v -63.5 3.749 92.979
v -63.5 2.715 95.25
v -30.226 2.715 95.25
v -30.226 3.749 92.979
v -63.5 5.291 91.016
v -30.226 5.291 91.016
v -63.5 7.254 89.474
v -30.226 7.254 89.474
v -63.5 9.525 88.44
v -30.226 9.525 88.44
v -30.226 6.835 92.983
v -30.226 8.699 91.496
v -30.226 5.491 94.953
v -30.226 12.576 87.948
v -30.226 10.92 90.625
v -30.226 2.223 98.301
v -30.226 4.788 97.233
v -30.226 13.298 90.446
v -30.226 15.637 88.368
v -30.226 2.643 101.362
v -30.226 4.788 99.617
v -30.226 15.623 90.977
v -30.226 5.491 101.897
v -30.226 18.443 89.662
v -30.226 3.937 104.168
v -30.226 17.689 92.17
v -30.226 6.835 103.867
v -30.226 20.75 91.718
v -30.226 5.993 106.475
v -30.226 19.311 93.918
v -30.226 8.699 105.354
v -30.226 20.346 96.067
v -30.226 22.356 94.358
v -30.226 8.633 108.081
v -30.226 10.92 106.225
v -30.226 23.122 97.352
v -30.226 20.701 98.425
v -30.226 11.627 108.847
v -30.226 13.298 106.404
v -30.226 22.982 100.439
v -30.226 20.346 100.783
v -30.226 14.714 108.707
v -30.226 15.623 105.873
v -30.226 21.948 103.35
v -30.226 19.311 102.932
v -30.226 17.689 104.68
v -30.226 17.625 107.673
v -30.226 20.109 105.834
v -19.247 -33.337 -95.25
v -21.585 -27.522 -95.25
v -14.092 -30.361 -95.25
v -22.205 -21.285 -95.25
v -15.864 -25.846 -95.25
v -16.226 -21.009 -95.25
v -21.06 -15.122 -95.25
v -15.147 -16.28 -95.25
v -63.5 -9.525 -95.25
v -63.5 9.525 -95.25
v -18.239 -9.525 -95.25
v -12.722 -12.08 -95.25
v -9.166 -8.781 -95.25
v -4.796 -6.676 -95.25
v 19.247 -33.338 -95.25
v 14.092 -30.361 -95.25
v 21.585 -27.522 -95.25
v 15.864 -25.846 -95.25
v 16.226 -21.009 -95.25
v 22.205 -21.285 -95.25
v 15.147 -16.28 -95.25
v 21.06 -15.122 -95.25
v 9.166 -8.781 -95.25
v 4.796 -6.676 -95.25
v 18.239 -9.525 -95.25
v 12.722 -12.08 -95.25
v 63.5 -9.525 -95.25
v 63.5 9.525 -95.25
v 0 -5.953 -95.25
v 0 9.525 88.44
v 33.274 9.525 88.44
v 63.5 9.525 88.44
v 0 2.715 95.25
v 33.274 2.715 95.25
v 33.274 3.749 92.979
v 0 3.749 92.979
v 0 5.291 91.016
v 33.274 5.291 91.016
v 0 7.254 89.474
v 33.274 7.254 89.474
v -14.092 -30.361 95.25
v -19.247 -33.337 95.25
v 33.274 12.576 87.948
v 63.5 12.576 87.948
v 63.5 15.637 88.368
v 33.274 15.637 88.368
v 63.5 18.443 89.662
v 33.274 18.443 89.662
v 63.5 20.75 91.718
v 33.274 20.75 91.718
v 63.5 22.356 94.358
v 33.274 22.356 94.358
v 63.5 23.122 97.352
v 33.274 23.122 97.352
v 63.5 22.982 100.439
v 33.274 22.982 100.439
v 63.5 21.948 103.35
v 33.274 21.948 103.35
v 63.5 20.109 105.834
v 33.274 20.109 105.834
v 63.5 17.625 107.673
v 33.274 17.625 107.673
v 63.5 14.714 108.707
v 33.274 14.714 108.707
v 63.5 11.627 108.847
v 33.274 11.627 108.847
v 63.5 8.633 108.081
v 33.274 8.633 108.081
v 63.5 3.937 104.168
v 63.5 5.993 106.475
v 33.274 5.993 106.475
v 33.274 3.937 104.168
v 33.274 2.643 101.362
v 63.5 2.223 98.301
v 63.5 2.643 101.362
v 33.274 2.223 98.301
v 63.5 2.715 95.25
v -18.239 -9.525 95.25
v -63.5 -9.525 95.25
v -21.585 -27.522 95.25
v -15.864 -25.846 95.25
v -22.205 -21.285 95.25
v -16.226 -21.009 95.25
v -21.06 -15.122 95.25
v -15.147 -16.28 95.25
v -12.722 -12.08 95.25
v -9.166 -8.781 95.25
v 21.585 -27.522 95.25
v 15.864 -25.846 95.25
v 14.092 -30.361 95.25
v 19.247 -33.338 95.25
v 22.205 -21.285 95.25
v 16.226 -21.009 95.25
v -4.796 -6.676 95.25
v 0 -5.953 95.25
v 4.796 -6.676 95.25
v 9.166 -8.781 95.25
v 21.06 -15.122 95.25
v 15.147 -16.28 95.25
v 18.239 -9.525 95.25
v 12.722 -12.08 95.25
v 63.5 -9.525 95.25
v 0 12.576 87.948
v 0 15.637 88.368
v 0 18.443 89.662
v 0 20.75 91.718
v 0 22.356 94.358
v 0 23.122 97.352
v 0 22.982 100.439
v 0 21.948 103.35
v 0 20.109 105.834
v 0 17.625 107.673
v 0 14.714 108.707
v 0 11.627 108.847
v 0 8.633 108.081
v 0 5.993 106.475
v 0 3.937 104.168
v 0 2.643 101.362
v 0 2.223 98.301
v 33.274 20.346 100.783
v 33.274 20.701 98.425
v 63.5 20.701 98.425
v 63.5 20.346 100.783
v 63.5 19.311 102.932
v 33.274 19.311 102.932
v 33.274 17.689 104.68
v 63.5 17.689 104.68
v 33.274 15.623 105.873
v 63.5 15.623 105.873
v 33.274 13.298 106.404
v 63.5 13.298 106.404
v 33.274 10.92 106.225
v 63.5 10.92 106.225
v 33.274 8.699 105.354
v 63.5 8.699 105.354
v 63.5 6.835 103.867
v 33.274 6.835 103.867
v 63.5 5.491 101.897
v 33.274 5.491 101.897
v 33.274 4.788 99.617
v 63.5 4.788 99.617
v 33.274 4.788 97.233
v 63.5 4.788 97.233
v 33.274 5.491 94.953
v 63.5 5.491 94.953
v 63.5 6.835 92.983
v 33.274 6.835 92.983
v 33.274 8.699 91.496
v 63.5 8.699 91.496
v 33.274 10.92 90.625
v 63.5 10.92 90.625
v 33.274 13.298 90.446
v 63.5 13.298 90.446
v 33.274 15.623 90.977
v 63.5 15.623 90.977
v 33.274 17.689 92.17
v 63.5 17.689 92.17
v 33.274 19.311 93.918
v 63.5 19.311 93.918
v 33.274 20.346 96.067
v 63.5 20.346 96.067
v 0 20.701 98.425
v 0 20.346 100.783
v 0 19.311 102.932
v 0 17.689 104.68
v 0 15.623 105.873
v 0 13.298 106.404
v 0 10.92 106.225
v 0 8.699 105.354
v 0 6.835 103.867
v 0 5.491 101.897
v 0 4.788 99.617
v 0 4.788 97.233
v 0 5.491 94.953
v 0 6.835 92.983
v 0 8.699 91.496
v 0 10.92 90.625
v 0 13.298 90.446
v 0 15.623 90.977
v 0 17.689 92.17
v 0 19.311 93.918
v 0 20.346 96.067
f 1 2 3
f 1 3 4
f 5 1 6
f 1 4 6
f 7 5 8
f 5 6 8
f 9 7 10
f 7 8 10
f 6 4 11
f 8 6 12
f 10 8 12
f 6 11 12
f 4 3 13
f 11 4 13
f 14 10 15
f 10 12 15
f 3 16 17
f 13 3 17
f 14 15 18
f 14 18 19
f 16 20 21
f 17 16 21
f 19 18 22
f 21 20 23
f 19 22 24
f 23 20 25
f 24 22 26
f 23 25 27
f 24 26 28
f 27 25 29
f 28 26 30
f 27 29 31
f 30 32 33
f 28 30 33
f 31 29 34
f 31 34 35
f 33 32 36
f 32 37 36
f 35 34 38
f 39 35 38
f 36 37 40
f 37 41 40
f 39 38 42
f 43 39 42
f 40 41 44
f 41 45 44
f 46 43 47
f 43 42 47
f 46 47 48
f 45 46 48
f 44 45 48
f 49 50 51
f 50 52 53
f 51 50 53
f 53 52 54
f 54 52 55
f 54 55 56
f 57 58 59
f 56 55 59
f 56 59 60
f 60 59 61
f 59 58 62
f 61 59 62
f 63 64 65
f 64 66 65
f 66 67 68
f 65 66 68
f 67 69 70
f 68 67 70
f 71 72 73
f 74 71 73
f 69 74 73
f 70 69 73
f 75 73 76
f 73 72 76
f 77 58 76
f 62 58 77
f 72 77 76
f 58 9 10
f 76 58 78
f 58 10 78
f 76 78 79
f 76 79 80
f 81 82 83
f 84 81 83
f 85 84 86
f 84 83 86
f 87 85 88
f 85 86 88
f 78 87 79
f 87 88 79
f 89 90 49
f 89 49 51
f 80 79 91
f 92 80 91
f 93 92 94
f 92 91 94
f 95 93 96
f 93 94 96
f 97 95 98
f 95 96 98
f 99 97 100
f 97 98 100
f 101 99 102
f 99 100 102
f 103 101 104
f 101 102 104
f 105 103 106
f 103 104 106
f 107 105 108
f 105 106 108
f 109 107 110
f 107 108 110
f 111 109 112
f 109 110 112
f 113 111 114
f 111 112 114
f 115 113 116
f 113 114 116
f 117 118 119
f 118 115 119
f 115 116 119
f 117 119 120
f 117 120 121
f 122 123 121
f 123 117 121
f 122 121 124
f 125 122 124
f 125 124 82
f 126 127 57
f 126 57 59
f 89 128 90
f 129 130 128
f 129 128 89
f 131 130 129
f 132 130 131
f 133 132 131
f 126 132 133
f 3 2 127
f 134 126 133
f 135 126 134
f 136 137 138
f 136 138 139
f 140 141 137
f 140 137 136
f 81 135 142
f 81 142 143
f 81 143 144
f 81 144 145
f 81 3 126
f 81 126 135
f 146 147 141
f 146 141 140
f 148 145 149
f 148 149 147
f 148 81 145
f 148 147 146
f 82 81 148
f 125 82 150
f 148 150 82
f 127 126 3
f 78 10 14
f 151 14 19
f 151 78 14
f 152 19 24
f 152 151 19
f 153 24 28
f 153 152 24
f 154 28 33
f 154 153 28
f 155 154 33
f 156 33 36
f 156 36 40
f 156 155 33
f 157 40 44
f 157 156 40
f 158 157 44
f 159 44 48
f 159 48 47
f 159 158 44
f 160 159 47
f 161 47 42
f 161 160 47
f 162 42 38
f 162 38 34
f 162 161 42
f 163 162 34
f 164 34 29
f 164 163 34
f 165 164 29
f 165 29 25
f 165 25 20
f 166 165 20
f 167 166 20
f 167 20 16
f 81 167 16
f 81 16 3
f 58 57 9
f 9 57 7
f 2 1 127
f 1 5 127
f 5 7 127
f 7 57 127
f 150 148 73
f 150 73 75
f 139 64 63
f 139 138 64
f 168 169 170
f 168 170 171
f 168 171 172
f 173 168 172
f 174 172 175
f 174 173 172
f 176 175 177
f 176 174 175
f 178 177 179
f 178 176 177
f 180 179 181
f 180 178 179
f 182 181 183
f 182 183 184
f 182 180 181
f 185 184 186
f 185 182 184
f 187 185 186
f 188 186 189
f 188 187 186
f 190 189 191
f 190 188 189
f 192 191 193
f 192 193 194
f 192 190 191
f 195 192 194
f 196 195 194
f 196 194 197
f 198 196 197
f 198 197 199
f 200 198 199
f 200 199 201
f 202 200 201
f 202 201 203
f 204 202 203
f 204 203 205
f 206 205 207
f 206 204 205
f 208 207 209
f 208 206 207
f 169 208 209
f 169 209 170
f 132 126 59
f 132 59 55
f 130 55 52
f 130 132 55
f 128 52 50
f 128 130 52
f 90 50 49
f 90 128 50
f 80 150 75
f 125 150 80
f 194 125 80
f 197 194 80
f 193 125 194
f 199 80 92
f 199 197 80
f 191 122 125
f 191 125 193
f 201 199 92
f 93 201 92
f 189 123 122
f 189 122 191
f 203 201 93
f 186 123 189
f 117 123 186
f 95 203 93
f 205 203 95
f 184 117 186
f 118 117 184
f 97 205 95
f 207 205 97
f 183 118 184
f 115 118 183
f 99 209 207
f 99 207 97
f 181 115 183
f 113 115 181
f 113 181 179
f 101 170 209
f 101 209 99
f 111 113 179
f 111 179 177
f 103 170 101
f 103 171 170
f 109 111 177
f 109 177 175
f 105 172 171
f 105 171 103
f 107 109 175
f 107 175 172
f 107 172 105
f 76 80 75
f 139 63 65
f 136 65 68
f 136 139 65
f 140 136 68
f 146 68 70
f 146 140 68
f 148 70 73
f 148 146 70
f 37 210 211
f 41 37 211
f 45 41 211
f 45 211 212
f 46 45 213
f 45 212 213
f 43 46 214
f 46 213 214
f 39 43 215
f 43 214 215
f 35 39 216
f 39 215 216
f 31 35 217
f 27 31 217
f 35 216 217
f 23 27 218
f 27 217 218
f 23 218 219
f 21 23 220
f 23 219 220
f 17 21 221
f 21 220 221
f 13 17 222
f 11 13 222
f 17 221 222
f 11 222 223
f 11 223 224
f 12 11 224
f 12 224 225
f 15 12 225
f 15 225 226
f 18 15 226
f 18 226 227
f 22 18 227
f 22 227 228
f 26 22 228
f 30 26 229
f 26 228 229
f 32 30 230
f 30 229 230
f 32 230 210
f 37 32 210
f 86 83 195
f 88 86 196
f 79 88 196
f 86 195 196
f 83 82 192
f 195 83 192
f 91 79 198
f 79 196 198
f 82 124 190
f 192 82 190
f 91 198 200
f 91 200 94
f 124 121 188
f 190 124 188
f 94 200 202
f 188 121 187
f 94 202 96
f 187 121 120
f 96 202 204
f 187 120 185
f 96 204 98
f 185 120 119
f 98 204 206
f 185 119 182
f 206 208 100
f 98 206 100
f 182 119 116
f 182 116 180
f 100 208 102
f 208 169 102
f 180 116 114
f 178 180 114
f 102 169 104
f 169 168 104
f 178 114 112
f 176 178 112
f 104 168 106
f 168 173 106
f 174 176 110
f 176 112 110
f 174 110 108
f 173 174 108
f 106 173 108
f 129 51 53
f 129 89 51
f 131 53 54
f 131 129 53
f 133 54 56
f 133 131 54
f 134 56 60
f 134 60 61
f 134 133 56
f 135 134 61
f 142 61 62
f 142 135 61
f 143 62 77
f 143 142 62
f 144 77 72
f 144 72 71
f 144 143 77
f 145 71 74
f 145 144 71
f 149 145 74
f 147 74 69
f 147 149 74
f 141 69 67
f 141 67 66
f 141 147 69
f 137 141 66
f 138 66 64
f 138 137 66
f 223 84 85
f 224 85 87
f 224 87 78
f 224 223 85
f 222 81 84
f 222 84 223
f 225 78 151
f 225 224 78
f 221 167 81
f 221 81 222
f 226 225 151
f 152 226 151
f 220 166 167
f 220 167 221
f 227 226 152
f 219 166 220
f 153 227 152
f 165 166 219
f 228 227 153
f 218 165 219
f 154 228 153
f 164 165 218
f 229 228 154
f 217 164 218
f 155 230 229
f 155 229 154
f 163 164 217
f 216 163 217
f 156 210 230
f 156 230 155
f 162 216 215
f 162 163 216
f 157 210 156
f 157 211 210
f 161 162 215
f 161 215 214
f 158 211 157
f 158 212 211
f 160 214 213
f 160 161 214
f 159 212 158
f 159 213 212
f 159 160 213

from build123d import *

# Parameters (mm, degrees)
F0_W          = 127
F0_H          = 190.5
F1_DEPTH      = 9.525
F3_DEPTH      = 95.251
F3_DEPTH_BACK = 95.251
F4_DEPTH      = 95.25
F5_R          = 10.4775
F5_R_2        = 8.001
F6_DEPTH      = 63.501
F6_DEPTH_BACK = 63.501
F7_DEPTH      = 30.226
F8_R          = 10.4775
F8_R_2        = 8.001
F9_DEPTH      = 30.226


# Not quite as in the source:
# - a pattern or mirror of a feature is missing from the dataset's text; its kind, count and spacing are read off the source's solid


with BuildPart() as f1:
    # F0 (on Front) → F1 (new body, symmetric)
    with BuildSketch(Plane.XZ):
        Rectangle(F0_W, F0_H)
    extrude(amount=F1_DEPTH, both=True)

    # F2 (on Top) → F3 (cut, two sides)
    with BuildSketch(Plane.XY) as f3_sk:
        with BuildLine():
            Line((14.0918571172, -30.3609375), (19.2474145991, -33.3375))
            ThreePointArc((19.2474145991, -33.3375), (0, 0), (-19.2474145991, -33.3375))
            Line((-19.2474145991, -33.3375), (-14.0918571172, -30.3609375))
            ThreePointArc((-14.0918571172, -30.3609375), (0, -5.953125), (14.0918571172, -30.3609375))
        make_face()
        with BuildLine():
            Line((0, -22.225), (14.0918571172, -30.3609375))
            ThreePointArc((14.0918571172, -30.3609375), (0, -5.953125), (-14.0918571172, -30.3609375))
            Line((-14.0918571172, -30.3609375), (0, -22.225))
        make_face()
    extrude(amount=F3_DEPTH, mode=Mode.SUBTRACT)
    extrude(f3_sk.sketch, amount=-F3_DEPTH_BACK, mode=Mode.SUBTRACT)

    # F2 (on Top) → F4 (join, symmetric)
    with BuildSketch(Plane.XY):
        with BuildLine():
            Line((14.0918571172, -30.3609375), (19.2474145991, -33.3375))
            ThreePointArc((19.2474145991, -33.3375), (0, 0), (-19.2474145991, -33.3375))
            Line((-19.2474145991, -33.3375), (-14.0918571172, -30.3609375))
            ThreePointArc((-14.0918571172, -30.3609375), (0, -5.953125), (14.0918571172, -30.3609375))
        make_face()
    extrude(amount=F4_DEPTH, both=True)

    # F5 (on Right) → F6 (cut, two sides)
    with BuildSketch(Plane.YZ) as f6_sk:
        with Locations((12.7, 98.425)):
            Circle(F5_R)
        with Locations((12.7, 98.425)):
            Circle(F5_R_2, mode=Mode.SUBTRACT)
        with Locations((12.7, 98.425)):
            Circle(F5_R_2)
    extrude(amount=-F6_DEPTH, mode=Mode.SUBTRACT)
    extrude(f6_sk.sketch, amount=F6_DEPTH_BACK, mode=Mode.SUBTRACT)

    # F5 (on Right) → F7 (join)
    with BuildSketch(Plane.YZ):
        with Locations((12.7, 98.425)):
            Circle(F5_R)
        with Locations((12.7, 98.425)):
            Circle(F5_R_2, mode=Mode.SUBTRACT)
    f7 = extrude(amount=-F7_DEPTH)

    # F7_copies: F7 across plane
    add(f7.mirror(Plane(origin=(16.637, 0, 0), x_dir=(0, 0, 1), z_dir=(1, 0, 0))))

    # F8 (on face) → F9 (join)
    with BuildSketch(Plane.YZ):
        with Locations((12.7, 98.425)):
            Circle(F8_R)
        with Locations((12.7, 98.425)):
            Circle(F8_R_2, mode=Mode.SUBTRACT)
    extrude(amount=-F9_DEPTH)


solid = f1.part
